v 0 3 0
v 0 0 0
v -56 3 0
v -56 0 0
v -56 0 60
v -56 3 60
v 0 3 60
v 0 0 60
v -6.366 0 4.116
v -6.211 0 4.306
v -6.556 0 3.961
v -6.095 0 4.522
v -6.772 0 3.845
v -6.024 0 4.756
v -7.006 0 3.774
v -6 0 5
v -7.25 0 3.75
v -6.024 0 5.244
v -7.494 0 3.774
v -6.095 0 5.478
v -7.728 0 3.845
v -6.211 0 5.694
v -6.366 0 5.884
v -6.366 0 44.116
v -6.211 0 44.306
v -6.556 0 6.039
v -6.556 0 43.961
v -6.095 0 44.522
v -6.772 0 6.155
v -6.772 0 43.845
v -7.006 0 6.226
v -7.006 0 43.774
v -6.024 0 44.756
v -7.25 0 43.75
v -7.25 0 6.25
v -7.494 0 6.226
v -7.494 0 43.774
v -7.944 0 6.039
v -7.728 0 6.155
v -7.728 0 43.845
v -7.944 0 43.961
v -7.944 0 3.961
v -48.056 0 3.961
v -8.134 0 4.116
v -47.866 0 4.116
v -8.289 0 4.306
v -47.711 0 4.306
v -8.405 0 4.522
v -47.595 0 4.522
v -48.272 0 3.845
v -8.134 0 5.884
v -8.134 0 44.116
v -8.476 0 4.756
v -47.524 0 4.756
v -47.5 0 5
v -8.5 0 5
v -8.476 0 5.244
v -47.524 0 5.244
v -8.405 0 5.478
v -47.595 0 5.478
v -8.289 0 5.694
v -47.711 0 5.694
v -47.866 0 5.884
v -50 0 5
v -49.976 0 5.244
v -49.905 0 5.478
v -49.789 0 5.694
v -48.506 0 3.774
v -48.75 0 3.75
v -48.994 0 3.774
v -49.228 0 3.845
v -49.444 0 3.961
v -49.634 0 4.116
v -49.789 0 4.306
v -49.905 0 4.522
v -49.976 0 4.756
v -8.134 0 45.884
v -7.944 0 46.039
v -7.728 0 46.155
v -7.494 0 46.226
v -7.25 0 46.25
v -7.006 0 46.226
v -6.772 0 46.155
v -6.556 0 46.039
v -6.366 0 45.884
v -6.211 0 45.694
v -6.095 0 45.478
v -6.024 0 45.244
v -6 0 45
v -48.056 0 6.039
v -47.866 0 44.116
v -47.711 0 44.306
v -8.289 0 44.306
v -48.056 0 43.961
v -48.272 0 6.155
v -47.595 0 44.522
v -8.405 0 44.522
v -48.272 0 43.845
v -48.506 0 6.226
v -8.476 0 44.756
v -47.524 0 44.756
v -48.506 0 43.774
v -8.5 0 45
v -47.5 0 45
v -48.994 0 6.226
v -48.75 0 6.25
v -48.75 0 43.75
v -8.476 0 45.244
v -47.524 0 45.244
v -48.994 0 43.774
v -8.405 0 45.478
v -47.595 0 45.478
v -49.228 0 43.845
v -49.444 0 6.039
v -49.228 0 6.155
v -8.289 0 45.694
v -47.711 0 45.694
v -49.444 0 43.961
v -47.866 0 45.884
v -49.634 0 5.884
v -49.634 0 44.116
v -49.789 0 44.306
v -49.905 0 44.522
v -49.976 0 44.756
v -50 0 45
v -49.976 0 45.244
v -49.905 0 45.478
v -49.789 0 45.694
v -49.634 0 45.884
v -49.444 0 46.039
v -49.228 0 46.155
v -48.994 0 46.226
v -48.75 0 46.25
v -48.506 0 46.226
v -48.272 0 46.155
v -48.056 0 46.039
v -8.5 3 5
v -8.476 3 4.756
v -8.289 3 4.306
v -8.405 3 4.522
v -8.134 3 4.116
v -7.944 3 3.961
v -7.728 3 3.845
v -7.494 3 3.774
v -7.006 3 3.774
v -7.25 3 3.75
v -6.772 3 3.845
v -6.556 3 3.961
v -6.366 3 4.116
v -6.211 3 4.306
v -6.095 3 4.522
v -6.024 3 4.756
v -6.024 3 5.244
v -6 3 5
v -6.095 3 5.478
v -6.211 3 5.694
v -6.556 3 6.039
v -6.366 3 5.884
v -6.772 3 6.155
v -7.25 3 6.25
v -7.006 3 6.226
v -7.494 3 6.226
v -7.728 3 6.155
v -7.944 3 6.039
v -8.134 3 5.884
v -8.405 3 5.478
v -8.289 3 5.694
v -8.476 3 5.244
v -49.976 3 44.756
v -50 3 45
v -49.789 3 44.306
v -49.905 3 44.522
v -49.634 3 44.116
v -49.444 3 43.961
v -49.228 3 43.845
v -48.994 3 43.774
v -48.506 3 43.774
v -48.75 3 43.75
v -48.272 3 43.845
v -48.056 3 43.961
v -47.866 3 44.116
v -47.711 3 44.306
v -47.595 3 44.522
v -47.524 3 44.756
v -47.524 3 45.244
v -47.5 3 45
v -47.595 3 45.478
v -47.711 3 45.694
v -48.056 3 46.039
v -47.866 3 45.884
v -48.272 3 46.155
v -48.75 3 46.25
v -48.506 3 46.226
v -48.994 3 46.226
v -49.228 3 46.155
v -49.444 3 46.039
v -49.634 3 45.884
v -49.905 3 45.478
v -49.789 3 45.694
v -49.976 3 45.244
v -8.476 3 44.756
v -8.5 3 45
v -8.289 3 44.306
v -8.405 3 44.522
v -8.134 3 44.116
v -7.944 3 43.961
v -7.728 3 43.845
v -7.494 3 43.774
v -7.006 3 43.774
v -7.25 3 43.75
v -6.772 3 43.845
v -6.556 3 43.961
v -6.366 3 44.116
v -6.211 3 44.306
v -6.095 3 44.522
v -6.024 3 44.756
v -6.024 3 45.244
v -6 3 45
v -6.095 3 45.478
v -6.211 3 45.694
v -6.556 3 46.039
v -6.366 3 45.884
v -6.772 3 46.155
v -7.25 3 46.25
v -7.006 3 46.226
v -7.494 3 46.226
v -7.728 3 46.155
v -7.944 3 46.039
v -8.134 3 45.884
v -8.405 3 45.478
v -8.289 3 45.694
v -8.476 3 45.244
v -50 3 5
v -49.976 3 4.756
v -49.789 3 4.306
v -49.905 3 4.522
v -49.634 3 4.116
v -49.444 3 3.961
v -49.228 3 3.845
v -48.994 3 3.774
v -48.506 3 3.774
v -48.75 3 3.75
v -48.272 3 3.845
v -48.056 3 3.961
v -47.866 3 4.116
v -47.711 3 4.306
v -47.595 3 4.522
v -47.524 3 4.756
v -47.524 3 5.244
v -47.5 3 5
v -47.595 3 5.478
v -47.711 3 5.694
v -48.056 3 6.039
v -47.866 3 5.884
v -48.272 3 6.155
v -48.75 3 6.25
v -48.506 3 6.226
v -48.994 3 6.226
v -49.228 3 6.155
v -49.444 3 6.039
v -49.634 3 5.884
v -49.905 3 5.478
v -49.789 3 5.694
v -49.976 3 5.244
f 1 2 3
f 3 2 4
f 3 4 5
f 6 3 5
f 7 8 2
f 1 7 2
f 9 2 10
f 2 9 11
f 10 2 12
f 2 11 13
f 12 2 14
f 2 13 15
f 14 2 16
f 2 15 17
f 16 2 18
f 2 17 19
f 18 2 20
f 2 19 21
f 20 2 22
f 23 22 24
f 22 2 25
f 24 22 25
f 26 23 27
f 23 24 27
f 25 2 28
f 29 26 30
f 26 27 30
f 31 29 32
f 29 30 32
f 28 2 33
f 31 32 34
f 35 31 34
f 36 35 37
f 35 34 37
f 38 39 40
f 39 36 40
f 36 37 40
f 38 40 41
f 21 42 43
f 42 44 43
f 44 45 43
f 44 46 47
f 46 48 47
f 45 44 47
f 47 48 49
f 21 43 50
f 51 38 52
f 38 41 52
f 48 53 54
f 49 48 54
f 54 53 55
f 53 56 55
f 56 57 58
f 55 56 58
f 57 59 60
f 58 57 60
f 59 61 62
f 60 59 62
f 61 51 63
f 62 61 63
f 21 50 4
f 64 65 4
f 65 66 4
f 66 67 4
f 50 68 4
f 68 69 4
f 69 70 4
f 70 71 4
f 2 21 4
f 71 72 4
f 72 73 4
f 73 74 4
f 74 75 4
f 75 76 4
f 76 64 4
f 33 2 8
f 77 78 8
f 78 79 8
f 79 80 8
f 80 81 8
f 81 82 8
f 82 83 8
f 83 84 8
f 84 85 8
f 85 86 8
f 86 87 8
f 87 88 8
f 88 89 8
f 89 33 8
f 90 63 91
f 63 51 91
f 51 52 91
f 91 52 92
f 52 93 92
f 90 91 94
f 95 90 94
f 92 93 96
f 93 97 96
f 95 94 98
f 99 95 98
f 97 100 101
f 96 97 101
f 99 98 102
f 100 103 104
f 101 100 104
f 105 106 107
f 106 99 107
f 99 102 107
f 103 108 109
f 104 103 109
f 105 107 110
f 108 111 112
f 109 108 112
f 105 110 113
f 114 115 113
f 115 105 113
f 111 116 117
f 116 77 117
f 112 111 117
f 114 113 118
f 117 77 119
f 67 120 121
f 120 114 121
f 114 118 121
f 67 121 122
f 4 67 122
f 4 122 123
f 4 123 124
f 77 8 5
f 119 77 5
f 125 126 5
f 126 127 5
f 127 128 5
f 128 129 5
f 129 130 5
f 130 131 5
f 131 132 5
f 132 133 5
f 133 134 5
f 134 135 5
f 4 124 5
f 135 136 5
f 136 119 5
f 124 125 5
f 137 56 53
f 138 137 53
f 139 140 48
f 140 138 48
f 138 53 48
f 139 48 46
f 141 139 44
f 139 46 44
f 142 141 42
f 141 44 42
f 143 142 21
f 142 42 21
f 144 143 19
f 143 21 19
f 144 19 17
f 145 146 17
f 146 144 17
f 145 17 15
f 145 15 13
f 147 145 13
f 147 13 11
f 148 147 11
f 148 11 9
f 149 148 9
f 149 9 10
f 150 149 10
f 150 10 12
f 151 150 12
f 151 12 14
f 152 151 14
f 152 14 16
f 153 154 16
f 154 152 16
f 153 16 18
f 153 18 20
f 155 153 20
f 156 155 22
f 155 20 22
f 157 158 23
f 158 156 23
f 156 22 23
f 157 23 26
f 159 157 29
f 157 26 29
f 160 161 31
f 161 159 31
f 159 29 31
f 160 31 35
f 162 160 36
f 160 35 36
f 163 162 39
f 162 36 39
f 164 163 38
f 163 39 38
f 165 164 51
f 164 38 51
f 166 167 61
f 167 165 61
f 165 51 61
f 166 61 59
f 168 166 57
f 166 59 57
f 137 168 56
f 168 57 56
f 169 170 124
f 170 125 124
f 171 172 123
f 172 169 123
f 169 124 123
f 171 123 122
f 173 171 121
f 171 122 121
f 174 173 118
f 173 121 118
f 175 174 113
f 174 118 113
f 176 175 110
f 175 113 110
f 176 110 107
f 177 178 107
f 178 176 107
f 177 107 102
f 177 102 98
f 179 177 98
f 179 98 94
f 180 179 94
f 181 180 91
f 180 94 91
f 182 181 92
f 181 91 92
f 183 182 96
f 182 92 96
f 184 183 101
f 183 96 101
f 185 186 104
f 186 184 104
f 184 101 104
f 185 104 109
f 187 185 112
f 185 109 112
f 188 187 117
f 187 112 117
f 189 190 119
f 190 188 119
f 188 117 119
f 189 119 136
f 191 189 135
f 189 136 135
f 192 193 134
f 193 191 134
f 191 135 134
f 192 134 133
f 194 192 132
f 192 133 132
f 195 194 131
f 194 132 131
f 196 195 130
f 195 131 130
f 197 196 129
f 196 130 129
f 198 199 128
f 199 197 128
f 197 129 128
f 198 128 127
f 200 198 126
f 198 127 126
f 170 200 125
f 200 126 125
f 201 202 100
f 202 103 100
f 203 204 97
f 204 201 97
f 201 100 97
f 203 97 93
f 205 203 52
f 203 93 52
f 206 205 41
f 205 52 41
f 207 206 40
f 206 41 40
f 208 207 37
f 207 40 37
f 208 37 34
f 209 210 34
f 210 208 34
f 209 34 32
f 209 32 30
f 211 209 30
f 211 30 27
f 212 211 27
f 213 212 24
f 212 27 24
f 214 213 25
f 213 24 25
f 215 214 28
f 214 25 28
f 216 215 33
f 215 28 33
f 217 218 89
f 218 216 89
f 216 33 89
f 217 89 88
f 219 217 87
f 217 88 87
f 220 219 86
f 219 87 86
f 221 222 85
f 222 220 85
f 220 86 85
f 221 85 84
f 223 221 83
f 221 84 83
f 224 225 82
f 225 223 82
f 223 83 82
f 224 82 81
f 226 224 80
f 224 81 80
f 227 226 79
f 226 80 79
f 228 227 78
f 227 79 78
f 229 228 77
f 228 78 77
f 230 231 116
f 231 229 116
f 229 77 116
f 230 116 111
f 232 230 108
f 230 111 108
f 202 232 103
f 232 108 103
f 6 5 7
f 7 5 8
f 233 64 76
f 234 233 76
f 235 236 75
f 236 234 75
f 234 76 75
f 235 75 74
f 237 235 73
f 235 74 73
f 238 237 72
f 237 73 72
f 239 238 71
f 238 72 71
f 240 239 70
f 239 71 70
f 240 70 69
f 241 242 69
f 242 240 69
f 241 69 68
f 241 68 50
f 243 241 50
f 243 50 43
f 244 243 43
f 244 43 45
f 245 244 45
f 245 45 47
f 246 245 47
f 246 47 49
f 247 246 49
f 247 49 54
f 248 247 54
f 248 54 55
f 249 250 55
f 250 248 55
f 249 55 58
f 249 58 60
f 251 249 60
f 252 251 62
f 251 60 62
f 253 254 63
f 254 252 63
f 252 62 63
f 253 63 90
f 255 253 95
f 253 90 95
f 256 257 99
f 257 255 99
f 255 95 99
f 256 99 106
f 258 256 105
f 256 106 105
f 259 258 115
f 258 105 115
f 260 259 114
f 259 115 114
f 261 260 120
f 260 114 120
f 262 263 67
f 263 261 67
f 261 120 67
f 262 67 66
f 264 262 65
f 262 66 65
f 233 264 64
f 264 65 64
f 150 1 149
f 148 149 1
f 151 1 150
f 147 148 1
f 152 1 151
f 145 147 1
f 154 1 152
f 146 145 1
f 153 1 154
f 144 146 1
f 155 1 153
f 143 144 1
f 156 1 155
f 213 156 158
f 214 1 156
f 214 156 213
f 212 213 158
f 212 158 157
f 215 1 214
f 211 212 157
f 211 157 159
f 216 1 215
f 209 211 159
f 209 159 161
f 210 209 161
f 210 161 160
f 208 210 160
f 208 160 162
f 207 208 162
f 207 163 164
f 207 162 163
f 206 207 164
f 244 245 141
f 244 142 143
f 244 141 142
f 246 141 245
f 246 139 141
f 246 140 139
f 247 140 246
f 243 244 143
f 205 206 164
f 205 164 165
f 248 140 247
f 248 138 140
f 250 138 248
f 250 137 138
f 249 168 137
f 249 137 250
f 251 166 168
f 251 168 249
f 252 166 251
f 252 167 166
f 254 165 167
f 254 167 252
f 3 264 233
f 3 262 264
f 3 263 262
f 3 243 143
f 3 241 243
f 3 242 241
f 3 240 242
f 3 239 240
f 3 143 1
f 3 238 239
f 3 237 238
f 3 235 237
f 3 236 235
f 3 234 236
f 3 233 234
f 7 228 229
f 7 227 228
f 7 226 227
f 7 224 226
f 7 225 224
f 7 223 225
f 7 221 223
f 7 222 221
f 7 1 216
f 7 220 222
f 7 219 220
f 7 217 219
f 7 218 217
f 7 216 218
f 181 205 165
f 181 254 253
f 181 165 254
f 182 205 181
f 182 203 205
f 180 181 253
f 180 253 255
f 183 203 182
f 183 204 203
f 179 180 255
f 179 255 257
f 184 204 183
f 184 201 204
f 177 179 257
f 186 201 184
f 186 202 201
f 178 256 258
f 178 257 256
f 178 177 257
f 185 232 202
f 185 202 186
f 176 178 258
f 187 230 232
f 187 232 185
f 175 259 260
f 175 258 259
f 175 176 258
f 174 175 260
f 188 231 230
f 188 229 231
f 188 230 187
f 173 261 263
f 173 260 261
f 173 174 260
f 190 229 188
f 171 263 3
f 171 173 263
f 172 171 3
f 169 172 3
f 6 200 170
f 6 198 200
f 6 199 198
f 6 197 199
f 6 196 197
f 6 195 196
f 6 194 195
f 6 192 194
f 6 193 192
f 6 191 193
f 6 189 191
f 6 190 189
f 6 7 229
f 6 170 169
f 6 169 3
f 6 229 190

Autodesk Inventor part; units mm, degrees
ref_plane "YZ Plane" through (0, 0, 0) normal (1, 0, 0) x (0, 1, 0)
ref_plane "XZ Plane" through (0, 0, 0) normal (0, 1, 0) x (-1, 0, 0)
ref_plane "XY Plane" through (0, 0, 0) normal (0, 0, 1) x (1, 0, 0)
sketch "Sketch1" plane through (0, 0, 0) normal (0, 1, 0) x (-1, 0, 0)
  line L0 (0, 0) -> (56, 0)
  line L1 (56, 0) -> (56, 60)
  line L2 (56, 60) -> (0, 60)
  line L3 (0, 60) -> (0, 0)
  circle A0 centre (7.25, 5) radius 1.25
  circle A1 centre (7.25, 45) radius 1.25
  line L4 (28, 60) -> (28, 0) construction
  circle A2 centre (48.75, 5) radius 1.25
  circle A3 centre (48.75, 45) radius 1.25
  dimension "d0" = 56
  dimension "d1" = 60
  dimension "d4" = 2.5
  dimension "d5" = 7.25
  dimension "d6" = 5
  dimension "d7" = 2.5
  dimension "d8" = 7.25
  dimension "d9" = 40
extrude "Extrusion1" add sketch "Sketch1" along normal blind 3
properties part number "wall-front-outer-scaled"
